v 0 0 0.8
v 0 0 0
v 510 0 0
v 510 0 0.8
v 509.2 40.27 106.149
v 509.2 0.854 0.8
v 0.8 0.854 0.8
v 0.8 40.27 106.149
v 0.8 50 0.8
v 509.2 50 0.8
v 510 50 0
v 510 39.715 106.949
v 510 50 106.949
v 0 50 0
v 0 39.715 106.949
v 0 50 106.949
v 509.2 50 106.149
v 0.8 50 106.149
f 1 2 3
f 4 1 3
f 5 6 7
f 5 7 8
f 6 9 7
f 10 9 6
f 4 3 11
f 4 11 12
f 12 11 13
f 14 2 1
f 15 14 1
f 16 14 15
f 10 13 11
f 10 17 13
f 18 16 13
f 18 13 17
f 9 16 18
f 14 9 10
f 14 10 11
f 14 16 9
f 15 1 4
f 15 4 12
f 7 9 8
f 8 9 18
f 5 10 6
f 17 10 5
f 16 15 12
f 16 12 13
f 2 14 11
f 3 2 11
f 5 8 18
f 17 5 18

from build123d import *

# Parameters (mm, degrees)
SKETCH1_W           = 510
SKETCH1_H           = 50
BOSS_EXTRUDE1_DEPTH = 0.8
BOSS_EXTRUDE2_DEPTH = 510
SHELL3_T            = -0.8


with BuildPart() as part:
    # Sketch1 → Boss-Extrude1 (new body)
    with BuildSketch(Plane.XY):
        with Locations((255, 25)):
            Rectangle(SKETCH1_W, SKETCH1_H)
    extrude(amount=BOSS_EXTRUDE1_DEPTH)

    # Sketch3 → Boss-Extrude2 (add)
    with BuildSketch(Plane.ZY):
        Polygon((0.8, 0), (106.948846413, 39.715428922), (106.948846413, 50), (90.052783597, 50), (89.601213207, 50), (74.506616927, 50), (0.8, 50), align=None)
    extrude(amount=-BOSS_EXTRUDE2_DEPTH)

    # Shell3
    shell3_openings = [part.faces().sort_by_distance(p)[0] for p in [
        (255, 50, 53.474423206),
    ]]
    offset(amount=SHELL3_T, openings=shell3_openings, kind=Kind.INTERSECTION)


solid = part.part
